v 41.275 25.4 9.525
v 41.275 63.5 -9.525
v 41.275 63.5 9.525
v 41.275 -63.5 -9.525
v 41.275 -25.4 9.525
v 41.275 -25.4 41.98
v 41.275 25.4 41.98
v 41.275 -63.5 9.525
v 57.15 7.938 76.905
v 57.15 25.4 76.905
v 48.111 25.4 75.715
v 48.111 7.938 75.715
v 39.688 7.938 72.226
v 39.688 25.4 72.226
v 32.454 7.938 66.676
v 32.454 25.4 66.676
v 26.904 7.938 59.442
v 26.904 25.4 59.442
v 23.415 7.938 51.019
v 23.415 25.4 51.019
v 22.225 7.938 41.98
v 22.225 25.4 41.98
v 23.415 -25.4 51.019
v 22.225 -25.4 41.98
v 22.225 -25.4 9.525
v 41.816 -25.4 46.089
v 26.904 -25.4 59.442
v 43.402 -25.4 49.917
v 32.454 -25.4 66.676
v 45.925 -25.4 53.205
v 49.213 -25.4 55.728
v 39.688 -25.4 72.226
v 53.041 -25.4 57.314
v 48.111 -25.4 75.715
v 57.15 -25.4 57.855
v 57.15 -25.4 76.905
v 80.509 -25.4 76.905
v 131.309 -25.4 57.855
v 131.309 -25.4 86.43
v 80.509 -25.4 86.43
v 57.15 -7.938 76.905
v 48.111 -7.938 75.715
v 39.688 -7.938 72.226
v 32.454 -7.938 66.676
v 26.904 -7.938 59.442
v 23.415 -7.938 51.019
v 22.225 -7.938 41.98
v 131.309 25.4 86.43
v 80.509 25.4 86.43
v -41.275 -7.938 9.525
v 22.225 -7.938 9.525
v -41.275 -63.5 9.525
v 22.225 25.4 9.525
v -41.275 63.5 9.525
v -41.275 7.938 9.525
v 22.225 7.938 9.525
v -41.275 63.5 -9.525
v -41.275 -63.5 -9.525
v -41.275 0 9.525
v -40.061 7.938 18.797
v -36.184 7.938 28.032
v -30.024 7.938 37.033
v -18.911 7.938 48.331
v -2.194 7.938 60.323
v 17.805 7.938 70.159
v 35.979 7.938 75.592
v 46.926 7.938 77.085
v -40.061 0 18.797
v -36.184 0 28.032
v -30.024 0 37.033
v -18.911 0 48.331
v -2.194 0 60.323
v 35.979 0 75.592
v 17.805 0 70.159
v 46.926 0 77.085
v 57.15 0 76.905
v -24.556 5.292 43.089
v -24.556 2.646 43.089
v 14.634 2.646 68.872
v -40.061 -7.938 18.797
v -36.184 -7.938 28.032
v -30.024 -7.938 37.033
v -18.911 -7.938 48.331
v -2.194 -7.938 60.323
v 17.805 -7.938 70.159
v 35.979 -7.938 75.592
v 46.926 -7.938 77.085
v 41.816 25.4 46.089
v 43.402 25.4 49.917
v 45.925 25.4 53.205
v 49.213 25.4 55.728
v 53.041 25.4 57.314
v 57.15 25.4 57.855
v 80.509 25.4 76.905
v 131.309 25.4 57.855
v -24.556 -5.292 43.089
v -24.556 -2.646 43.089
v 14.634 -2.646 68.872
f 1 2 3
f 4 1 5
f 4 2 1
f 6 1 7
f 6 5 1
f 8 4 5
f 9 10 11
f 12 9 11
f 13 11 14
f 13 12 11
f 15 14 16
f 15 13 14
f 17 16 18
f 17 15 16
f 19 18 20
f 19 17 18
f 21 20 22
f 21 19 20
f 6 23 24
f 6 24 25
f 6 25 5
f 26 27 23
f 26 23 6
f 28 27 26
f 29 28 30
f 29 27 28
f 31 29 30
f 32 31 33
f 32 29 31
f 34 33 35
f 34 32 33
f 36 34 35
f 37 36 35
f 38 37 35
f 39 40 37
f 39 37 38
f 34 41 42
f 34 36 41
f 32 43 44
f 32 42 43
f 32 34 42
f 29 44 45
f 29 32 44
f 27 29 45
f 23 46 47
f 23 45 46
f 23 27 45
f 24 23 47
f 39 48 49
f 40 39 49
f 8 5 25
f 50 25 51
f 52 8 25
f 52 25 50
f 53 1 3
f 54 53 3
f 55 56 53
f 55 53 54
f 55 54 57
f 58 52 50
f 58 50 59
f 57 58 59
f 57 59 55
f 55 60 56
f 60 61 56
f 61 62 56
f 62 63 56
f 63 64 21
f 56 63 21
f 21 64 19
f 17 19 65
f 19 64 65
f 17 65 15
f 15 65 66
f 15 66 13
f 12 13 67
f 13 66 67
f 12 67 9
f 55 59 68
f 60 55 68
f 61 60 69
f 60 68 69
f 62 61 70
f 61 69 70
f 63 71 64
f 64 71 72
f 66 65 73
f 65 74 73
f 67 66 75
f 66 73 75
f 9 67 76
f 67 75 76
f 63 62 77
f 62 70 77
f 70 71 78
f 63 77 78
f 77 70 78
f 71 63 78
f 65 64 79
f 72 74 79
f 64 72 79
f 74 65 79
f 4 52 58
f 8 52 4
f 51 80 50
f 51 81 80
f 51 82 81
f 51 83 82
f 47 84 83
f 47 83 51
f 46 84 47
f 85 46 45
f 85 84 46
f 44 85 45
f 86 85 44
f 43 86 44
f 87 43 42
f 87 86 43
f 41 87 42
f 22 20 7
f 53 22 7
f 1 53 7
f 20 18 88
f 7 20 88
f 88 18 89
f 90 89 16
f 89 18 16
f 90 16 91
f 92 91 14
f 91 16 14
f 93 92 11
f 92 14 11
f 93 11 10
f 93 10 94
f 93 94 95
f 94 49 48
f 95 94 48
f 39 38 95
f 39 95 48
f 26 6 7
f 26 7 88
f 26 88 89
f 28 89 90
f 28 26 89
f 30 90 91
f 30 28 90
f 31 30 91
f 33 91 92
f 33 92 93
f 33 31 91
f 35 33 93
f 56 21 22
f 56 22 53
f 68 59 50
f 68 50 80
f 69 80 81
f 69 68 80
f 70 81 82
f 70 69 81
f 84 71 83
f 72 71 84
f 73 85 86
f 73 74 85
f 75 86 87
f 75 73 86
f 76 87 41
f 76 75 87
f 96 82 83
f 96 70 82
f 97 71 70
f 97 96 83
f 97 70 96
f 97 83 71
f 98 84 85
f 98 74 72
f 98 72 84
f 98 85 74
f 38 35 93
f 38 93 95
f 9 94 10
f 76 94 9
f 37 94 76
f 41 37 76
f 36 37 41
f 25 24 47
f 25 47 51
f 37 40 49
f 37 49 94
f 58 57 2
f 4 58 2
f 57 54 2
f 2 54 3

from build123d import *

# Parameters (mm, degrees)
F1_DEPTH = 63.5
F2_DEPTH = 25.4
F3_DEPTH = 25.4
F4_DEPTH = 7.9375


with BuildPart() as f1:
    # F0 (on Front) → F1 (new body, symmetric)
    with BuildSketch(Plane.XZ):
        Polygon((41.275, -9.525), (41.275, 9.525), (22.225, 9.525), (-41.275, 9.525), (-41.275, -9.525), align=None)
    extrude(amount=F1_DEPTH, both=True)

    # F0 (on Front) → F2 (join, symmetric)
    with BuildSketch(Plane.XZ):
        with BuildLine():
            Line((22.225, 9.525), (41.275, 9.525))
            Line((41.275, 9.525), (41.275, 41.979897))
            ThreePointArc((41.275, 41.979897), (45.92468, 53.205217), (57.15, 57.854897))
            Line((57.15, 57.854897), (80.508934, 57.854897))
            Line((80.508934, 57.854897), (80.508934, 76.904897))
            Line((80.508934, 76.904897), (57.15, 76.904897))
            ThreePointArc((57.15, 76.904897), (32.454296, 66.675601), (22.225, 41.979897))
            Line((22.225, 41.979897), (22.225, 9.525))
        make_face()
    extrude(amount=F2_DEPTH, both=True)

    # F0 (on Front) → F3 (join, symmetric)
    with BuildSketch(Plane.XZ):
        Polygon((80.508934, 76.904897), (80.508934, 57.854897), (131.308934, 57.854897), (131.308934, 86.429897), (80.508934, 86.429897), align=None)
    extrude(amount=F3_DEPTH, both=True)

    # F0 (on Front) → F4 (join, symmetric)
    with BuildSketch(Plane.XZ):
        with BuildLine():
            Line((-41.275, 9.525), (22.225, 9.525))
            Line((22.225, 9.525), (22.225, 41.979897))
            ThreePointArc((22.225, 41.979897), (32.454296, 66.675601), (57.15, 76.904897))
            add(Edge.make_bspline(
                [(-41.275, 9.525), (-42.17181, 43.657206), (19.351373, 81.069473), (57.15, 76.904897)],
                knots=[0, 0, 0, 0, 119.279215, 119.279215, 119.279215, 119.279215], degree=3))
        make_face()
    extrude(amount=F4_DEPTH, both=True)


solid = f1.part
